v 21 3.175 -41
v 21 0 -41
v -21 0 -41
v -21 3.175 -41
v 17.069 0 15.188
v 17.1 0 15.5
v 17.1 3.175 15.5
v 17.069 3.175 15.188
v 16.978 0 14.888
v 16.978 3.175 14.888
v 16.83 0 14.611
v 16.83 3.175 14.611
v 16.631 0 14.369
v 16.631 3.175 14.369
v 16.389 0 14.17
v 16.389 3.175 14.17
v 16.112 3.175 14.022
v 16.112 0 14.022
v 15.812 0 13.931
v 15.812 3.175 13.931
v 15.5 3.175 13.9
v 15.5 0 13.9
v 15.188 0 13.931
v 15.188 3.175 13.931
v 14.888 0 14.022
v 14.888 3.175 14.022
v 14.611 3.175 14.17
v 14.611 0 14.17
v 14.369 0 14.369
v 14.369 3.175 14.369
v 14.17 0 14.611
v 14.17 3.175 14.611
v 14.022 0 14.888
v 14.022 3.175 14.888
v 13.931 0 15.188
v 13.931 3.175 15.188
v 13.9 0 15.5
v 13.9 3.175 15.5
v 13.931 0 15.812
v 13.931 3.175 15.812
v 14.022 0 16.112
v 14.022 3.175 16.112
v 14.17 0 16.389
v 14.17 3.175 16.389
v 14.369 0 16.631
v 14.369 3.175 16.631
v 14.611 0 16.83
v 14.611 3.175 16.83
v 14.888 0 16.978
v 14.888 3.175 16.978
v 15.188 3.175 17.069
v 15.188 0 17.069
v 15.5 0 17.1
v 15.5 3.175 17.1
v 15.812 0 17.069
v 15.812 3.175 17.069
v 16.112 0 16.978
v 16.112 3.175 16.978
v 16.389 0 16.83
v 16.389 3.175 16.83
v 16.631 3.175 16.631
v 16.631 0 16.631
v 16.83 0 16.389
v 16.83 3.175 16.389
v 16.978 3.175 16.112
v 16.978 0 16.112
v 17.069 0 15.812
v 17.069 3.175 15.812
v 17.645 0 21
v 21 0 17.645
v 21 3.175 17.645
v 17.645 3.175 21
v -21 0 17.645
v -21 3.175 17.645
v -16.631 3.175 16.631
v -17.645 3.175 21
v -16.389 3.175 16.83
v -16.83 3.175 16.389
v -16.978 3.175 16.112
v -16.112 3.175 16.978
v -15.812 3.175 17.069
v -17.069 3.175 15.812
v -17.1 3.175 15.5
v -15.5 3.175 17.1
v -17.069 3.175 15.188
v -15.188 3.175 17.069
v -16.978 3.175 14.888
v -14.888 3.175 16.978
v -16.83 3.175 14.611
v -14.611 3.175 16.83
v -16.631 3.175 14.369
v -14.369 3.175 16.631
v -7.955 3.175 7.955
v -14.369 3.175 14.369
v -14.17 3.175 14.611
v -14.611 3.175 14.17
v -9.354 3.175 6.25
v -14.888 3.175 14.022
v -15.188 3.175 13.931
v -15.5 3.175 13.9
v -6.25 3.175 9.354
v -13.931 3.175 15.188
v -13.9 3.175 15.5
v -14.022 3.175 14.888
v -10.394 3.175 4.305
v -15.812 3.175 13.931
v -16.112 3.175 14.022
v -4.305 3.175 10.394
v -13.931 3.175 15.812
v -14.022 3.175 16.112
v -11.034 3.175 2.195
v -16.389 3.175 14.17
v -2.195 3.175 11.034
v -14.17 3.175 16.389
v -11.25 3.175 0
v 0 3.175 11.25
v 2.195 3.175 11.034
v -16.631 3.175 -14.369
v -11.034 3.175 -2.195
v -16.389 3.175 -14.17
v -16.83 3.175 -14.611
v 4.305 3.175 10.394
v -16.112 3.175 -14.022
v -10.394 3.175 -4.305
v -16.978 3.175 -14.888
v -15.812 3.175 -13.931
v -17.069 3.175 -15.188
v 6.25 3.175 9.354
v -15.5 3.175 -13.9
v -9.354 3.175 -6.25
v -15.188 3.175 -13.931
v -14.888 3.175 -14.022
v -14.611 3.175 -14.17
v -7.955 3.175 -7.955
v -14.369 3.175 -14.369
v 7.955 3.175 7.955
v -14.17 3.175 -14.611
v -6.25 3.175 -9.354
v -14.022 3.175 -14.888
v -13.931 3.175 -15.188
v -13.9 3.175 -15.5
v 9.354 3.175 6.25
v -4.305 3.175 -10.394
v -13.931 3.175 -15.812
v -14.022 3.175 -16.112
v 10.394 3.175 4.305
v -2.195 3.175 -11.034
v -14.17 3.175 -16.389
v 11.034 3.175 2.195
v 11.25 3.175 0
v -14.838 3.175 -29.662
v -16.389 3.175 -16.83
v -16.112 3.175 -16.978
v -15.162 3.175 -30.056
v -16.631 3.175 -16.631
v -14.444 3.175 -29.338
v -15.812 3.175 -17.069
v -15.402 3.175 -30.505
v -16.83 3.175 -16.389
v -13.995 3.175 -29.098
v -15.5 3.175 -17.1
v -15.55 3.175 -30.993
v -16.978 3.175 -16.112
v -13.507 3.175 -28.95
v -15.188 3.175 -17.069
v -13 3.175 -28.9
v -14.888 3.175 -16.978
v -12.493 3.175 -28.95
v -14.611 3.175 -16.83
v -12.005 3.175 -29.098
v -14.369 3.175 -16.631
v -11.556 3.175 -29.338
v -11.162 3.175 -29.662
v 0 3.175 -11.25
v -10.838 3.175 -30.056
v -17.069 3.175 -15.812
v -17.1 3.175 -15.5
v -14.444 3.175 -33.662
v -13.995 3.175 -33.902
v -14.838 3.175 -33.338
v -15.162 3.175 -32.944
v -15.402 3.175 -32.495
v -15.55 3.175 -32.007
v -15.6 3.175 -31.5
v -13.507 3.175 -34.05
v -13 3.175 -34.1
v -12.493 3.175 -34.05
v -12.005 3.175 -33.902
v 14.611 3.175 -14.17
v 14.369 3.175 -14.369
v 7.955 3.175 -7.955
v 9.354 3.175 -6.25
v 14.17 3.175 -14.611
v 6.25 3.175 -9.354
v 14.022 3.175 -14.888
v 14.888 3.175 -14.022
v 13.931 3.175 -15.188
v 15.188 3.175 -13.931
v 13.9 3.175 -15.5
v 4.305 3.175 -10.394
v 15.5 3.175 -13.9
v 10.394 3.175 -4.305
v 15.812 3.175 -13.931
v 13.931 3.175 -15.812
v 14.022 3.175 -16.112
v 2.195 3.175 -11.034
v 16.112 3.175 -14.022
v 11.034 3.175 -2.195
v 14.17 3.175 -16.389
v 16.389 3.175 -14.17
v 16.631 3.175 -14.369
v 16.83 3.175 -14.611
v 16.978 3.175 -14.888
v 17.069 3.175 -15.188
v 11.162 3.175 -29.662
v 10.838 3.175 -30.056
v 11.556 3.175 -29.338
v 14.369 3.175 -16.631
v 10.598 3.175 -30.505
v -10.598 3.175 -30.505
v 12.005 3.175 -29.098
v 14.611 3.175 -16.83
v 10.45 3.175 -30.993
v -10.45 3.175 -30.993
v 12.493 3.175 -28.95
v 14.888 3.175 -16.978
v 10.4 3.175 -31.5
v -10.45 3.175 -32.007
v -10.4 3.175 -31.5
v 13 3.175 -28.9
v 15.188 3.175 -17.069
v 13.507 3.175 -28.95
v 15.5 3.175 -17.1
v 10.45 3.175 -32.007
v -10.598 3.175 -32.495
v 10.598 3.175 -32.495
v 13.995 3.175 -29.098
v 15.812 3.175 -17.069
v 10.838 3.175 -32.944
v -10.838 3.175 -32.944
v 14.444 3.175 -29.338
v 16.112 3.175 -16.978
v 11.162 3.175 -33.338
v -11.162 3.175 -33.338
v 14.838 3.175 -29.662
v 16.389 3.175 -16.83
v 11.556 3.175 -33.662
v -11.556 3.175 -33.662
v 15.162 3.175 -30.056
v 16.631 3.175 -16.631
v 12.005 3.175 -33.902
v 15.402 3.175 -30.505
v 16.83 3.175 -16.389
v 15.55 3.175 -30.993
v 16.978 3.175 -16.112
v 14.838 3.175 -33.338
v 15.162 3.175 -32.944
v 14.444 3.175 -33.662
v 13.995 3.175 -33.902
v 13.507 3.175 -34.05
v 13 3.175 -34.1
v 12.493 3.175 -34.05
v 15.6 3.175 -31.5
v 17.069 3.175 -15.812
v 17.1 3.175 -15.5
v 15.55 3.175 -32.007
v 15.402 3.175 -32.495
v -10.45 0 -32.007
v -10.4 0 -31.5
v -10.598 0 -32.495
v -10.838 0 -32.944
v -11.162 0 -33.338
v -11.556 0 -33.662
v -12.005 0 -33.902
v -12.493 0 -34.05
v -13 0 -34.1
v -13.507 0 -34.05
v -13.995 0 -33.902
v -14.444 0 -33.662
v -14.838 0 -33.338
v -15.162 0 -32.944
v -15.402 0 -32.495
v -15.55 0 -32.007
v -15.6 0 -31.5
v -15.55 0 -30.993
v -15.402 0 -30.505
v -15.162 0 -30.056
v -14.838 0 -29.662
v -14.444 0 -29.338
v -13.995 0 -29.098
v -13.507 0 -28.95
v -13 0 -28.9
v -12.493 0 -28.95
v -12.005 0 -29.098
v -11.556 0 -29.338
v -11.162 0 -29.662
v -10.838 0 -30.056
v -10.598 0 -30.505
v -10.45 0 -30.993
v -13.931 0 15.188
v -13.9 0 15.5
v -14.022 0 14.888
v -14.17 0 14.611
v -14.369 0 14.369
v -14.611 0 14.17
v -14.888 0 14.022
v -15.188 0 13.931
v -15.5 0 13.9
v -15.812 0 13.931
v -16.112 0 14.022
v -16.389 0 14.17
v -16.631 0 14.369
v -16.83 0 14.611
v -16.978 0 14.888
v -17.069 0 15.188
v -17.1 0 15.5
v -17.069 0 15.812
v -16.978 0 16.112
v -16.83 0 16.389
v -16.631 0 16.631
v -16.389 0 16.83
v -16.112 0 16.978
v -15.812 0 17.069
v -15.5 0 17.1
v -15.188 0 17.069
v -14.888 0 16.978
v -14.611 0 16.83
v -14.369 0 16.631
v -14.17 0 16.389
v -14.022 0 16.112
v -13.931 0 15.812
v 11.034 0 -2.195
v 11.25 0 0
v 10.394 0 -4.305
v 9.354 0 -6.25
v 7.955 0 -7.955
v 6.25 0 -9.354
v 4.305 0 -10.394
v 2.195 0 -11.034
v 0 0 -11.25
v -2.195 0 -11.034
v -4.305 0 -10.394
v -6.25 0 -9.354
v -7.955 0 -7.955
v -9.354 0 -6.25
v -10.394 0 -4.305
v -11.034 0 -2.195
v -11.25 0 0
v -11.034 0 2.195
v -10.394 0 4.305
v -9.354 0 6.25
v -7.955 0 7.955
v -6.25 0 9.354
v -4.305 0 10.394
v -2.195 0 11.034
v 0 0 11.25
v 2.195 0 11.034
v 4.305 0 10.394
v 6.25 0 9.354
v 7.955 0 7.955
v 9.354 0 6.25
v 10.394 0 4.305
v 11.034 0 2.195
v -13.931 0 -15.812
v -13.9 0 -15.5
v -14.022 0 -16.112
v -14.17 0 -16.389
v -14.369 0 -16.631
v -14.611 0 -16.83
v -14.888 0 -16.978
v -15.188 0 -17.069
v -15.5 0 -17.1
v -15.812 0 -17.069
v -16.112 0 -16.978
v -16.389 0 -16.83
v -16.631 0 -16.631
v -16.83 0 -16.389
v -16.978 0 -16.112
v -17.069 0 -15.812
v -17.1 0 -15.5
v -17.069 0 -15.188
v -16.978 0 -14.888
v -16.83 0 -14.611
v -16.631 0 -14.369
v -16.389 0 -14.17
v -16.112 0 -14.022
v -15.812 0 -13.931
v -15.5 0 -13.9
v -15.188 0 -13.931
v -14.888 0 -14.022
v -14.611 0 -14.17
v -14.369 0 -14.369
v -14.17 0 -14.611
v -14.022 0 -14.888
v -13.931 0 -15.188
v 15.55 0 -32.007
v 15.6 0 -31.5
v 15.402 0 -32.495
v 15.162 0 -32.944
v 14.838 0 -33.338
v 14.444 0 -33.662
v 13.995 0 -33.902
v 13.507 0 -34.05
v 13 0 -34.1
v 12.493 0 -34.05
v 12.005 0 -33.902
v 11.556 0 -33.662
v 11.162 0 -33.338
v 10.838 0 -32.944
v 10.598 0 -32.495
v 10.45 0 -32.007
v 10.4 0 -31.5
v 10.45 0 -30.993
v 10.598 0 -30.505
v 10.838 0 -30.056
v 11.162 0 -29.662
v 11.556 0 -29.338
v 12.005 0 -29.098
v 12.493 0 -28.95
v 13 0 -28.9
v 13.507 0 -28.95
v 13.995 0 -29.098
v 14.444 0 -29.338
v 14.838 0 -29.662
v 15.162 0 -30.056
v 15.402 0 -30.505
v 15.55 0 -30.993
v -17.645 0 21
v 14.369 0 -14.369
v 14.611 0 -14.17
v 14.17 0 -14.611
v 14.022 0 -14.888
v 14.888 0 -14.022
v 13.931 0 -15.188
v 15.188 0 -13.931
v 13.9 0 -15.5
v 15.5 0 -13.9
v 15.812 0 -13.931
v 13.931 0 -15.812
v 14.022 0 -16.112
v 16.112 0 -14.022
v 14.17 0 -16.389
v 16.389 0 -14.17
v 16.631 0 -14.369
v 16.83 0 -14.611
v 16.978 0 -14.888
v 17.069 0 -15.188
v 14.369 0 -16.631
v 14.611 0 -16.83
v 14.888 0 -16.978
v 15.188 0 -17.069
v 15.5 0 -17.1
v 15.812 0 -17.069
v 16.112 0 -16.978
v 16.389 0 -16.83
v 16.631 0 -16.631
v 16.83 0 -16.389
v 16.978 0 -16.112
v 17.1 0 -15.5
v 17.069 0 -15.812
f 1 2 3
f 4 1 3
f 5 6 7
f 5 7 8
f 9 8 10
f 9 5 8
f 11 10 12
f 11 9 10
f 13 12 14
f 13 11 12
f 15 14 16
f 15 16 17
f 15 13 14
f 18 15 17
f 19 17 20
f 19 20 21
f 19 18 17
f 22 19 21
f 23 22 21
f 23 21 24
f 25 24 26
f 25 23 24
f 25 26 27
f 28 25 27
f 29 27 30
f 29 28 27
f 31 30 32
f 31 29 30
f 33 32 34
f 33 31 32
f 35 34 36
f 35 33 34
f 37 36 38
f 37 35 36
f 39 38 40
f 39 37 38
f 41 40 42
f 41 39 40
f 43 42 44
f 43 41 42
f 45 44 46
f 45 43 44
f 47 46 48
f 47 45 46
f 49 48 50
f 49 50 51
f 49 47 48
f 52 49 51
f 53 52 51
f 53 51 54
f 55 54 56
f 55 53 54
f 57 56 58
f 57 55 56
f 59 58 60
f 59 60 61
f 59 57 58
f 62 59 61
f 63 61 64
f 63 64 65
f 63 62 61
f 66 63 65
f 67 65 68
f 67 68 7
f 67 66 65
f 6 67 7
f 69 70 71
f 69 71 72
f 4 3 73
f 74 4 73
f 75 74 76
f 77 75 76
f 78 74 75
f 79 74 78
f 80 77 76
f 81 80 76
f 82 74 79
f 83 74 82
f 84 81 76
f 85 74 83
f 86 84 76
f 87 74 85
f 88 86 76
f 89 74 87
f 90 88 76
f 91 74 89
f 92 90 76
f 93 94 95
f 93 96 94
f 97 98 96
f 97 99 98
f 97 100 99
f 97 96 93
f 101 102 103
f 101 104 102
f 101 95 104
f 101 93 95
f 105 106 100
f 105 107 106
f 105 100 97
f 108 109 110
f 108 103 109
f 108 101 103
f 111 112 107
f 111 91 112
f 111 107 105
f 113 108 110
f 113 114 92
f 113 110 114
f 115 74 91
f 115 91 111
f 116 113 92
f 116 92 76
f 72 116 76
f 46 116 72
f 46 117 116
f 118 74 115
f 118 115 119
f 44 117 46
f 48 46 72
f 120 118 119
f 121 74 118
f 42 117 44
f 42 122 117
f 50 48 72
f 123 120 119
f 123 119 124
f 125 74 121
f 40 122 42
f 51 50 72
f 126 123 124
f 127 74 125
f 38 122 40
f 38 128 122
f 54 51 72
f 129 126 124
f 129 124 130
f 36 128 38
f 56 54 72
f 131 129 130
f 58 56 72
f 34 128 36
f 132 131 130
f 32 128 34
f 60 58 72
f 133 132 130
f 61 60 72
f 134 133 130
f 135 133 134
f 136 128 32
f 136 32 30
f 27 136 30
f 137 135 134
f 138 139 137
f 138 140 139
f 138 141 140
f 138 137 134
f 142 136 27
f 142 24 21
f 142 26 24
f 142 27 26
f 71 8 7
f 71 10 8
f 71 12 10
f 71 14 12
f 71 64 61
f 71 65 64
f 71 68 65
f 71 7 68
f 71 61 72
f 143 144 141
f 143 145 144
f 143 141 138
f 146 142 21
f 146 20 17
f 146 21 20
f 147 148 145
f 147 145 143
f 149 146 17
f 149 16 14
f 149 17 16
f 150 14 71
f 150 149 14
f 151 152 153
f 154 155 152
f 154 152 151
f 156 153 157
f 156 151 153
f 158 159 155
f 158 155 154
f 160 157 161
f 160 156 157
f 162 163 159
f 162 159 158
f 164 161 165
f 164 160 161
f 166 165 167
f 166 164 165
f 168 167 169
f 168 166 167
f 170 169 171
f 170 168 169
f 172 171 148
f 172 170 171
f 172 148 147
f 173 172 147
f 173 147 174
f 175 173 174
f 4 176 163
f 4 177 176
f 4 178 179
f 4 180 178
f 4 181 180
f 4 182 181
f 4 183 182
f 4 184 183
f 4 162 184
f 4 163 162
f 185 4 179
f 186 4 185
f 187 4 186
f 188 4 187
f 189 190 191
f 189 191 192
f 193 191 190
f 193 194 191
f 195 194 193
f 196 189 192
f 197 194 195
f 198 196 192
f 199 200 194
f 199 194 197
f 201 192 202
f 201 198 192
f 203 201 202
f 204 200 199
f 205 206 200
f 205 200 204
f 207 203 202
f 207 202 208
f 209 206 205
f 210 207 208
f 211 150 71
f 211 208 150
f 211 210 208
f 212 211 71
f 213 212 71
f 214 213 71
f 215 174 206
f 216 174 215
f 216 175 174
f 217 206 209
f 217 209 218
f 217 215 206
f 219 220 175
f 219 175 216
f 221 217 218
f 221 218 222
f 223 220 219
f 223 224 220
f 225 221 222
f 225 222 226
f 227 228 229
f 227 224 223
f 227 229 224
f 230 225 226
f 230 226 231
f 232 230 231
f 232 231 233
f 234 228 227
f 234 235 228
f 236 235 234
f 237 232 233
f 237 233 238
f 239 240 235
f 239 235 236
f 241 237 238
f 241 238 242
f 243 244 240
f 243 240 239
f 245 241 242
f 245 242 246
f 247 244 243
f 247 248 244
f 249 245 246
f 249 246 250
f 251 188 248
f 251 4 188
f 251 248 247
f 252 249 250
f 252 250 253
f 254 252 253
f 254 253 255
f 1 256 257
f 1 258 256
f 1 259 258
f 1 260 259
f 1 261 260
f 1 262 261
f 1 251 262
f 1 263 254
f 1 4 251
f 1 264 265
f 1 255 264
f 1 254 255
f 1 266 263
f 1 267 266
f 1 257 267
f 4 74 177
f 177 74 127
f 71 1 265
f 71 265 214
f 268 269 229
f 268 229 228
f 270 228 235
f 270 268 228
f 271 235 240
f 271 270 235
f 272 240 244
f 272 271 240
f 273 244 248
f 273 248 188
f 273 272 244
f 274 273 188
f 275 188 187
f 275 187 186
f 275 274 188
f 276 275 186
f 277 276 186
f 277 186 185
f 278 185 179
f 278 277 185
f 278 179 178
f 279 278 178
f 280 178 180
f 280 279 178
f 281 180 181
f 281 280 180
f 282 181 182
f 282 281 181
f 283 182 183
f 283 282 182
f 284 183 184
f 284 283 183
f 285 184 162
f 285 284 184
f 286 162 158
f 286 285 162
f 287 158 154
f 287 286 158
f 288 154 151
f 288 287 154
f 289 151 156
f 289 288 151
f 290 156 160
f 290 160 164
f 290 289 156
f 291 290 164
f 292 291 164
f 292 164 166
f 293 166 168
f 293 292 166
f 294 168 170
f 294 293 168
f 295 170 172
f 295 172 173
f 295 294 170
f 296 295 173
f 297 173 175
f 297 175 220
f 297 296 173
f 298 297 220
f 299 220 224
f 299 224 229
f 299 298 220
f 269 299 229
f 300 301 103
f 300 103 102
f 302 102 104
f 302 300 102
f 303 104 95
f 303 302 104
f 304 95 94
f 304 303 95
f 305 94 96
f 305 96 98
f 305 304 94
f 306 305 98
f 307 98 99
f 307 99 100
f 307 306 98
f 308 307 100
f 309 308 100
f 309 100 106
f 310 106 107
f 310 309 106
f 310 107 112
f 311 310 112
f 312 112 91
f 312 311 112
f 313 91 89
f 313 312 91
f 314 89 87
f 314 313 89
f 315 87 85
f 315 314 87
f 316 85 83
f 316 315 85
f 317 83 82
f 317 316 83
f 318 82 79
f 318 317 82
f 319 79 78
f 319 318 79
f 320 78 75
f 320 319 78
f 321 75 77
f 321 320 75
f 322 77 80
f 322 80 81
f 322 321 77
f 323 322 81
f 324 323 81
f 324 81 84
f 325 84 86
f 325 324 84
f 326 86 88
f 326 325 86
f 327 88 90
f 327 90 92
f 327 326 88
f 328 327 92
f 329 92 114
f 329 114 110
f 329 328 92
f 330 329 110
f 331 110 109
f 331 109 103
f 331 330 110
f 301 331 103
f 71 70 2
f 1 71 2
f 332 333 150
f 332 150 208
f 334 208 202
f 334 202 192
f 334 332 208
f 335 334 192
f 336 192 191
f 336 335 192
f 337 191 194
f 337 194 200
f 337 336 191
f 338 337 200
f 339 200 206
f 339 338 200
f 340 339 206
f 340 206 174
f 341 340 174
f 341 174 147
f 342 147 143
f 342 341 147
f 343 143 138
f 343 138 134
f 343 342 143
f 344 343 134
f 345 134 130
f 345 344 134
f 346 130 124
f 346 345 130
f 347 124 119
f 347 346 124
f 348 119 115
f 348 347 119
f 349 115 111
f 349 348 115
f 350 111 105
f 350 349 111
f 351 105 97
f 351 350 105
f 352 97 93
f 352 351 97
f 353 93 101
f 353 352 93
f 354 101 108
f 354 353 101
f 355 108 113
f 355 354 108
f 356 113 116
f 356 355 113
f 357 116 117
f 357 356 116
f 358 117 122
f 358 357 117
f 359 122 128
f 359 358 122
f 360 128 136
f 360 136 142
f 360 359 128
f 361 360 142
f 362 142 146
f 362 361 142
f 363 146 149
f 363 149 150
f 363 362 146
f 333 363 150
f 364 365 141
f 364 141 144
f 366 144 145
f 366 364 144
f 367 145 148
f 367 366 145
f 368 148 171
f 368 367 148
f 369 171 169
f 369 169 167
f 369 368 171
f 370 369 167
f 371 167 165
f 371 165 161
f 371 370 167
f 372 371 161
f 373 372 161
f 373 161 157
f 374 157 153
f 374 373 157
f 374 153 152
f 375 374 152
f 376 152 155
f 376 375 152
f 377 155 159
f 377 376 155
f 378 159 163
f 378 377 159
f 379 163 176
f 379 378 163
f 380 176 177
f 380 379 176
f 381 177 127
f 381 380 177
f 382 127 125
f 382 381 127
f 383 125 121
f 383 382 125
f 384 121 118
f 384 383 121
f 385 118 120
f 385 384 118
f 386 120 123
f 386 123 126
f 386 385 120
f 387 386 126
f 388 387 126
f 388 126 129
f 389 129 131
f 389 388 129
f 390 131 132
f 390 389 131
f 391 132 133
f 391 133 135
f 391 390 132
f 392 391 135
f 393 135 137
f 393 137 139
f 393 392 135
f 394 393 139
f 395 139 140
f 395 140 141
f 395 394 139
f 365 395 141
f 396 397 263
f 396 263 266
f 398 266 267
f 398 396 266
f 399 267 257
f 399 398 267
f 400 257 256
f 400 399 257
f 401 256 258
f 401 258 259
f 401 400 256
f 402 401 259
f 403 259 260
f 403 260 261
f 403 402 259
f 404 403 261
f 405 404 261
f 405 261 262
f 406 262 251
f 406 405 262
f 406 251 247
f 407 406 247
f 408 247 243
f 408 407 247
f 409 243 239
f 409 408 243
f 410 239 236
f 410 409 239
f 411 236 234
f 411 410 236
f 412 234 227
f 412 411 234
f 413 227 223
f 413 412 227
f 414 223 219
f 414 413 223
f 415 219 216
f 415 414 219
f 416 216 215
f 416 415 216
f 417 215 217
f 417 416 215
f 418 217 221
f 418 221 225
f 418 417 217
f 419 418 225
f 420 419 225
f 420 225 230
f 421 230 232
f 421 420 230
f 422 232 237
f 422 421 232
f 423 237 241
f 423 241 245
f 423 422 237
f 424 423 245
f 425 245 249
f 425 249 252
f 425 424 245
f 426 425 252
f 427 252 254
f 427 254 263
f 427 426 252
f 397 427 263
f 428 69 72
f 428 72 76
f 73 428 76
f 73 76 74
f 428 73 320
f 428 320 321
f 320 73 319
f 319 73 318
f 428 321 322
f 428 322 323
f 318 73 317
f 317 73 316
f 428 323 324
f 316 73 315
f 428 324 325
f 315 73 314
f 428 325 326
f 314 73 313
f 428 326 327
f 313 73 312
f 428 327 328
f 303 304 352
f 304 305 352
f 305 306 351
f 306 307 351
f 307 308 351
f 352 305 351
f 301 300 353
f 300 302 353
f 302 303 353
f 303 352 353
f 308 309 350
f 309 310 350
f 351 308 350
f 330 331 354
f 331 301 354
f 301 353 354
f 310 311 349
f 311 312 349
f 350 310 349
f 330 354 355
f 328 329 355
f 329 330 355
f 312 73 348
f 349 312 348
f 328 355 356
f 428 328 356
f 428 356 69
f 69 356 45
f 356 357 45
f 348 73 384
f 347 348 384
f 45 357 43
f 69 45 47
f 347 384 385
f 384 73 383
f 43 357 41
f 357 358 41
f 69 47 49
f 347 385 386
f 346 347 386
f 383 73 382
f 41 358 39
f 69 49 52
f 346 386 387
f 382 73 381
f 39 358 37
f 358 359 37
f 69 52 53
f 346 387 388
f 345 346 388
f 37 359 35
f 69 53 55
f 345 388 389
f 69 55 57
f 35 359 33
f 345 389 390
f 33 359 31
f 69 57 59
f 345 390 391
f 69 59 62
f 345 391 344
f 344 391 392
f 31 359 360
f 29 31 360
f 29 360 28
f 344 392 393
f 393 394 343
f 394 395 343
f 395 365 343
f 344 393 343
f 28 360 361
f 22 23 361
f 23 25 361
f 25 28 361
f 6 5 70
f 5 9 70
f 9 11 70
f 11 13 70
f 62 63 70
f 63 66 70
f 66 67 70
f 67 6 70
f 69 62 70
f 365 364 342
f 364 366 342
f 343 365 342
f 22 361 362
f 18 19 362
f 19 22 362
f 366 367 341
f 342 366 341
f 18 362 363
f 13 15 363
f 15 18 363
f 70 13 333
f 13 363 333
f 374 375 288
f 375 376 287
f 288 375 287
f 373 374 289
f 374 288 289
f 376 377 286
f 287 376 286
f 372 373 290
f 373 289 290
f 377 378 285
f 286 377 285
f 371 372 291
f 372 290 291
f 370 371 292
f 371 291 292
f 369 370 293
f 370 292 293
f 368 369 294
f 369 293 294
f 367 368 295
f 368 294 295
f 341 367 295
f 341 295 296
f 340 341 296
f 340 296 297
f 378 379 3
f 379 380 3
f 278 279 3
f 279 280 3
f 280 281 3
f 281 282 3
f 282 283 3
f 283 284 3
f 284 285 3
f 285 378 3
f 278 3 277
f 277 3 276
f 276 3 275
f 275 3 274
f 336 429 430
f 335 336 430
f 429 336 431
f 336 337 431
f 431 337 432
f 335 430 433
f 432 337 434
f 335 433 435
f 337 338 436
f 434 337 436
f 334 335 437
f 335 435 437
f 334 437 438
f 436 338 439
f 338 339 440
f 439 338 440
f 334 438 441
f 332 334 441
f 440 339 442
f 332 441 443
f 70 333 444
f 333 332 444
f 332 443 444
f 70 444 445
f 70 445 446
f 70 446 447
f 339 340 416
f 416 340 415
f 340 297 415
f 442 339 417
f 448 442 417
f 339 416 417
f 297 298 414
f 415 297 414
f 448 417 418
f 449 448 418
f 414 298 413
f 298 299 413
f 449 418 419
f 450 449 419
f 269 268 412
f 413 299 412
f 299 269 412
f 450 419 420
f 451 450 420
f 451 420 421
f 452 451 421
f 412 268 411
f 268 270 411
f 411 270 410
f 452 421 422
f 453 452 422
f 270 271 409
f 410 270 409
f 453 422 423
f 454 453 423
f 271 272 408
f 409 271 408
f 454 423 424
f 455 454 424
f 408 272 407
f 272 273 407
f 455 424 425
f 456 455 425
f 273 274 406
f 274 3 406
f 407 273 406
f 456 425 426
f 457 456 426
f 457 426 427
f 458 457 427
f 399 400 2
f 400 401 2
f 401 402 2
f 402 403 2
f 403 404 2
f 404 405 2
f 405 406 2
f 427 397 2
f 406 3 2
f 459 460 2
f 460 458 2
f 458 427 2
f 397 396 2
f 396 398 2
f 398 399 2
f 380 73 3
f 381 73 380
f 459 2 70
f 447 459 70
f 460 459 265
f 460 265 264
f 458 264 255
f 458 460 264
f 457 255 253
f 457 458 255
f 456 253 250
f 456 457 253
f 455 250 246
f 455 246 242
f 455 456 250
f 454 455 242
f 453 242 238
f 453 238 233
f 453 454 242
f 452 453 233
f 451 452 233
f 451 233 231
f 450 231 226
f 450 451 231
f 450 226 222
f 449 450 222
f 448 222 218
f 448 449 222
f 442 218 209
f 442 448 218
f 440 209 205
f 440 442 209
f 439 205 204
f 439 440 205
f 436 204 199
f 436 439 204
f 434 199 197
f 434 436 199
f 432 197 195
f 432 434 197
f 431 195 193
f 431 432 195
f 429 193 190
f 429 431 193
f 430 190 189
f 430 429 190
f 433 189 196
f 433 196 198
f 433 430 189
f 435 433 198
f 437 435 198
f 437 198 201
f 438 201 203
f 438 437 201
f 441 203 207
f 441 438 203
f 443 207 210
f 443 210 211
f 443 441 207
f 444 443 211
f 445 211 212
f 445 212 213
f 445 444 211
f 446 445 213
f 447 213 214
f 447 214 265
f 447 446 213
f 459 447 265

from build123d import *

# Parameters (mm, degrees)
SKETCH1_R           = 2.6
SKETCH1_R_2         = 1.6
SKETCH1_R_3         = 11.25
BOSS_EXTRUDE1_DEPTH = 3.175


with BuildPart() as part:
    # Sketch1 → Boss-Extrude1 (new body)
    with BuildSketch(Plane(origin=(0, 0, 0), x_dir=(1, 0, 0), z_dir=(0, 1, 0))):
        Polygon((21, 41), (-21, 41), (-21, 17.645), (-17.645, 21), (17.645, 21), (21, 17.645), align=None)
        with Locations((-13, 31.5)):
            Circle(SKETCH1_R, mode=Mode.SUBTRACT)
        with Locations((13, 31.5)):
            Circle(SKETCH1_R, mode=Mode.SUBTRACT)
        Polygon((-21, -17.645), (-21, 17.645), (-17.645, 21), (17.645, 21), (21, 17.645), (21, -17.645), (17.645, -21), (-17.645, -21), align=None)
        with Locations((15.5, -15.5)):
            Circle(SKETCH1_R_2, mode=Mode.SUBTRACT)
        with Locations((15.5, 15.5)):
            Circle(SKETCH1_R_2, mode=Mode.SUBTRACT)
        with Locations((-15.5, 15.5)):
            Circle(SKETCH1_R_2, mode=Mode.SUBTRACT)
        with Locations((-15.5, -15.5)):
            Circle(SKETCH1_R_2, mode=Mode.SUBTRACT)
        Circle(SKETCH1_R_3, mode=Mode.SUBTRACT)
    extrude(amount=BOSS_EXTRUDE1_DEPTH)


solid = part.part
